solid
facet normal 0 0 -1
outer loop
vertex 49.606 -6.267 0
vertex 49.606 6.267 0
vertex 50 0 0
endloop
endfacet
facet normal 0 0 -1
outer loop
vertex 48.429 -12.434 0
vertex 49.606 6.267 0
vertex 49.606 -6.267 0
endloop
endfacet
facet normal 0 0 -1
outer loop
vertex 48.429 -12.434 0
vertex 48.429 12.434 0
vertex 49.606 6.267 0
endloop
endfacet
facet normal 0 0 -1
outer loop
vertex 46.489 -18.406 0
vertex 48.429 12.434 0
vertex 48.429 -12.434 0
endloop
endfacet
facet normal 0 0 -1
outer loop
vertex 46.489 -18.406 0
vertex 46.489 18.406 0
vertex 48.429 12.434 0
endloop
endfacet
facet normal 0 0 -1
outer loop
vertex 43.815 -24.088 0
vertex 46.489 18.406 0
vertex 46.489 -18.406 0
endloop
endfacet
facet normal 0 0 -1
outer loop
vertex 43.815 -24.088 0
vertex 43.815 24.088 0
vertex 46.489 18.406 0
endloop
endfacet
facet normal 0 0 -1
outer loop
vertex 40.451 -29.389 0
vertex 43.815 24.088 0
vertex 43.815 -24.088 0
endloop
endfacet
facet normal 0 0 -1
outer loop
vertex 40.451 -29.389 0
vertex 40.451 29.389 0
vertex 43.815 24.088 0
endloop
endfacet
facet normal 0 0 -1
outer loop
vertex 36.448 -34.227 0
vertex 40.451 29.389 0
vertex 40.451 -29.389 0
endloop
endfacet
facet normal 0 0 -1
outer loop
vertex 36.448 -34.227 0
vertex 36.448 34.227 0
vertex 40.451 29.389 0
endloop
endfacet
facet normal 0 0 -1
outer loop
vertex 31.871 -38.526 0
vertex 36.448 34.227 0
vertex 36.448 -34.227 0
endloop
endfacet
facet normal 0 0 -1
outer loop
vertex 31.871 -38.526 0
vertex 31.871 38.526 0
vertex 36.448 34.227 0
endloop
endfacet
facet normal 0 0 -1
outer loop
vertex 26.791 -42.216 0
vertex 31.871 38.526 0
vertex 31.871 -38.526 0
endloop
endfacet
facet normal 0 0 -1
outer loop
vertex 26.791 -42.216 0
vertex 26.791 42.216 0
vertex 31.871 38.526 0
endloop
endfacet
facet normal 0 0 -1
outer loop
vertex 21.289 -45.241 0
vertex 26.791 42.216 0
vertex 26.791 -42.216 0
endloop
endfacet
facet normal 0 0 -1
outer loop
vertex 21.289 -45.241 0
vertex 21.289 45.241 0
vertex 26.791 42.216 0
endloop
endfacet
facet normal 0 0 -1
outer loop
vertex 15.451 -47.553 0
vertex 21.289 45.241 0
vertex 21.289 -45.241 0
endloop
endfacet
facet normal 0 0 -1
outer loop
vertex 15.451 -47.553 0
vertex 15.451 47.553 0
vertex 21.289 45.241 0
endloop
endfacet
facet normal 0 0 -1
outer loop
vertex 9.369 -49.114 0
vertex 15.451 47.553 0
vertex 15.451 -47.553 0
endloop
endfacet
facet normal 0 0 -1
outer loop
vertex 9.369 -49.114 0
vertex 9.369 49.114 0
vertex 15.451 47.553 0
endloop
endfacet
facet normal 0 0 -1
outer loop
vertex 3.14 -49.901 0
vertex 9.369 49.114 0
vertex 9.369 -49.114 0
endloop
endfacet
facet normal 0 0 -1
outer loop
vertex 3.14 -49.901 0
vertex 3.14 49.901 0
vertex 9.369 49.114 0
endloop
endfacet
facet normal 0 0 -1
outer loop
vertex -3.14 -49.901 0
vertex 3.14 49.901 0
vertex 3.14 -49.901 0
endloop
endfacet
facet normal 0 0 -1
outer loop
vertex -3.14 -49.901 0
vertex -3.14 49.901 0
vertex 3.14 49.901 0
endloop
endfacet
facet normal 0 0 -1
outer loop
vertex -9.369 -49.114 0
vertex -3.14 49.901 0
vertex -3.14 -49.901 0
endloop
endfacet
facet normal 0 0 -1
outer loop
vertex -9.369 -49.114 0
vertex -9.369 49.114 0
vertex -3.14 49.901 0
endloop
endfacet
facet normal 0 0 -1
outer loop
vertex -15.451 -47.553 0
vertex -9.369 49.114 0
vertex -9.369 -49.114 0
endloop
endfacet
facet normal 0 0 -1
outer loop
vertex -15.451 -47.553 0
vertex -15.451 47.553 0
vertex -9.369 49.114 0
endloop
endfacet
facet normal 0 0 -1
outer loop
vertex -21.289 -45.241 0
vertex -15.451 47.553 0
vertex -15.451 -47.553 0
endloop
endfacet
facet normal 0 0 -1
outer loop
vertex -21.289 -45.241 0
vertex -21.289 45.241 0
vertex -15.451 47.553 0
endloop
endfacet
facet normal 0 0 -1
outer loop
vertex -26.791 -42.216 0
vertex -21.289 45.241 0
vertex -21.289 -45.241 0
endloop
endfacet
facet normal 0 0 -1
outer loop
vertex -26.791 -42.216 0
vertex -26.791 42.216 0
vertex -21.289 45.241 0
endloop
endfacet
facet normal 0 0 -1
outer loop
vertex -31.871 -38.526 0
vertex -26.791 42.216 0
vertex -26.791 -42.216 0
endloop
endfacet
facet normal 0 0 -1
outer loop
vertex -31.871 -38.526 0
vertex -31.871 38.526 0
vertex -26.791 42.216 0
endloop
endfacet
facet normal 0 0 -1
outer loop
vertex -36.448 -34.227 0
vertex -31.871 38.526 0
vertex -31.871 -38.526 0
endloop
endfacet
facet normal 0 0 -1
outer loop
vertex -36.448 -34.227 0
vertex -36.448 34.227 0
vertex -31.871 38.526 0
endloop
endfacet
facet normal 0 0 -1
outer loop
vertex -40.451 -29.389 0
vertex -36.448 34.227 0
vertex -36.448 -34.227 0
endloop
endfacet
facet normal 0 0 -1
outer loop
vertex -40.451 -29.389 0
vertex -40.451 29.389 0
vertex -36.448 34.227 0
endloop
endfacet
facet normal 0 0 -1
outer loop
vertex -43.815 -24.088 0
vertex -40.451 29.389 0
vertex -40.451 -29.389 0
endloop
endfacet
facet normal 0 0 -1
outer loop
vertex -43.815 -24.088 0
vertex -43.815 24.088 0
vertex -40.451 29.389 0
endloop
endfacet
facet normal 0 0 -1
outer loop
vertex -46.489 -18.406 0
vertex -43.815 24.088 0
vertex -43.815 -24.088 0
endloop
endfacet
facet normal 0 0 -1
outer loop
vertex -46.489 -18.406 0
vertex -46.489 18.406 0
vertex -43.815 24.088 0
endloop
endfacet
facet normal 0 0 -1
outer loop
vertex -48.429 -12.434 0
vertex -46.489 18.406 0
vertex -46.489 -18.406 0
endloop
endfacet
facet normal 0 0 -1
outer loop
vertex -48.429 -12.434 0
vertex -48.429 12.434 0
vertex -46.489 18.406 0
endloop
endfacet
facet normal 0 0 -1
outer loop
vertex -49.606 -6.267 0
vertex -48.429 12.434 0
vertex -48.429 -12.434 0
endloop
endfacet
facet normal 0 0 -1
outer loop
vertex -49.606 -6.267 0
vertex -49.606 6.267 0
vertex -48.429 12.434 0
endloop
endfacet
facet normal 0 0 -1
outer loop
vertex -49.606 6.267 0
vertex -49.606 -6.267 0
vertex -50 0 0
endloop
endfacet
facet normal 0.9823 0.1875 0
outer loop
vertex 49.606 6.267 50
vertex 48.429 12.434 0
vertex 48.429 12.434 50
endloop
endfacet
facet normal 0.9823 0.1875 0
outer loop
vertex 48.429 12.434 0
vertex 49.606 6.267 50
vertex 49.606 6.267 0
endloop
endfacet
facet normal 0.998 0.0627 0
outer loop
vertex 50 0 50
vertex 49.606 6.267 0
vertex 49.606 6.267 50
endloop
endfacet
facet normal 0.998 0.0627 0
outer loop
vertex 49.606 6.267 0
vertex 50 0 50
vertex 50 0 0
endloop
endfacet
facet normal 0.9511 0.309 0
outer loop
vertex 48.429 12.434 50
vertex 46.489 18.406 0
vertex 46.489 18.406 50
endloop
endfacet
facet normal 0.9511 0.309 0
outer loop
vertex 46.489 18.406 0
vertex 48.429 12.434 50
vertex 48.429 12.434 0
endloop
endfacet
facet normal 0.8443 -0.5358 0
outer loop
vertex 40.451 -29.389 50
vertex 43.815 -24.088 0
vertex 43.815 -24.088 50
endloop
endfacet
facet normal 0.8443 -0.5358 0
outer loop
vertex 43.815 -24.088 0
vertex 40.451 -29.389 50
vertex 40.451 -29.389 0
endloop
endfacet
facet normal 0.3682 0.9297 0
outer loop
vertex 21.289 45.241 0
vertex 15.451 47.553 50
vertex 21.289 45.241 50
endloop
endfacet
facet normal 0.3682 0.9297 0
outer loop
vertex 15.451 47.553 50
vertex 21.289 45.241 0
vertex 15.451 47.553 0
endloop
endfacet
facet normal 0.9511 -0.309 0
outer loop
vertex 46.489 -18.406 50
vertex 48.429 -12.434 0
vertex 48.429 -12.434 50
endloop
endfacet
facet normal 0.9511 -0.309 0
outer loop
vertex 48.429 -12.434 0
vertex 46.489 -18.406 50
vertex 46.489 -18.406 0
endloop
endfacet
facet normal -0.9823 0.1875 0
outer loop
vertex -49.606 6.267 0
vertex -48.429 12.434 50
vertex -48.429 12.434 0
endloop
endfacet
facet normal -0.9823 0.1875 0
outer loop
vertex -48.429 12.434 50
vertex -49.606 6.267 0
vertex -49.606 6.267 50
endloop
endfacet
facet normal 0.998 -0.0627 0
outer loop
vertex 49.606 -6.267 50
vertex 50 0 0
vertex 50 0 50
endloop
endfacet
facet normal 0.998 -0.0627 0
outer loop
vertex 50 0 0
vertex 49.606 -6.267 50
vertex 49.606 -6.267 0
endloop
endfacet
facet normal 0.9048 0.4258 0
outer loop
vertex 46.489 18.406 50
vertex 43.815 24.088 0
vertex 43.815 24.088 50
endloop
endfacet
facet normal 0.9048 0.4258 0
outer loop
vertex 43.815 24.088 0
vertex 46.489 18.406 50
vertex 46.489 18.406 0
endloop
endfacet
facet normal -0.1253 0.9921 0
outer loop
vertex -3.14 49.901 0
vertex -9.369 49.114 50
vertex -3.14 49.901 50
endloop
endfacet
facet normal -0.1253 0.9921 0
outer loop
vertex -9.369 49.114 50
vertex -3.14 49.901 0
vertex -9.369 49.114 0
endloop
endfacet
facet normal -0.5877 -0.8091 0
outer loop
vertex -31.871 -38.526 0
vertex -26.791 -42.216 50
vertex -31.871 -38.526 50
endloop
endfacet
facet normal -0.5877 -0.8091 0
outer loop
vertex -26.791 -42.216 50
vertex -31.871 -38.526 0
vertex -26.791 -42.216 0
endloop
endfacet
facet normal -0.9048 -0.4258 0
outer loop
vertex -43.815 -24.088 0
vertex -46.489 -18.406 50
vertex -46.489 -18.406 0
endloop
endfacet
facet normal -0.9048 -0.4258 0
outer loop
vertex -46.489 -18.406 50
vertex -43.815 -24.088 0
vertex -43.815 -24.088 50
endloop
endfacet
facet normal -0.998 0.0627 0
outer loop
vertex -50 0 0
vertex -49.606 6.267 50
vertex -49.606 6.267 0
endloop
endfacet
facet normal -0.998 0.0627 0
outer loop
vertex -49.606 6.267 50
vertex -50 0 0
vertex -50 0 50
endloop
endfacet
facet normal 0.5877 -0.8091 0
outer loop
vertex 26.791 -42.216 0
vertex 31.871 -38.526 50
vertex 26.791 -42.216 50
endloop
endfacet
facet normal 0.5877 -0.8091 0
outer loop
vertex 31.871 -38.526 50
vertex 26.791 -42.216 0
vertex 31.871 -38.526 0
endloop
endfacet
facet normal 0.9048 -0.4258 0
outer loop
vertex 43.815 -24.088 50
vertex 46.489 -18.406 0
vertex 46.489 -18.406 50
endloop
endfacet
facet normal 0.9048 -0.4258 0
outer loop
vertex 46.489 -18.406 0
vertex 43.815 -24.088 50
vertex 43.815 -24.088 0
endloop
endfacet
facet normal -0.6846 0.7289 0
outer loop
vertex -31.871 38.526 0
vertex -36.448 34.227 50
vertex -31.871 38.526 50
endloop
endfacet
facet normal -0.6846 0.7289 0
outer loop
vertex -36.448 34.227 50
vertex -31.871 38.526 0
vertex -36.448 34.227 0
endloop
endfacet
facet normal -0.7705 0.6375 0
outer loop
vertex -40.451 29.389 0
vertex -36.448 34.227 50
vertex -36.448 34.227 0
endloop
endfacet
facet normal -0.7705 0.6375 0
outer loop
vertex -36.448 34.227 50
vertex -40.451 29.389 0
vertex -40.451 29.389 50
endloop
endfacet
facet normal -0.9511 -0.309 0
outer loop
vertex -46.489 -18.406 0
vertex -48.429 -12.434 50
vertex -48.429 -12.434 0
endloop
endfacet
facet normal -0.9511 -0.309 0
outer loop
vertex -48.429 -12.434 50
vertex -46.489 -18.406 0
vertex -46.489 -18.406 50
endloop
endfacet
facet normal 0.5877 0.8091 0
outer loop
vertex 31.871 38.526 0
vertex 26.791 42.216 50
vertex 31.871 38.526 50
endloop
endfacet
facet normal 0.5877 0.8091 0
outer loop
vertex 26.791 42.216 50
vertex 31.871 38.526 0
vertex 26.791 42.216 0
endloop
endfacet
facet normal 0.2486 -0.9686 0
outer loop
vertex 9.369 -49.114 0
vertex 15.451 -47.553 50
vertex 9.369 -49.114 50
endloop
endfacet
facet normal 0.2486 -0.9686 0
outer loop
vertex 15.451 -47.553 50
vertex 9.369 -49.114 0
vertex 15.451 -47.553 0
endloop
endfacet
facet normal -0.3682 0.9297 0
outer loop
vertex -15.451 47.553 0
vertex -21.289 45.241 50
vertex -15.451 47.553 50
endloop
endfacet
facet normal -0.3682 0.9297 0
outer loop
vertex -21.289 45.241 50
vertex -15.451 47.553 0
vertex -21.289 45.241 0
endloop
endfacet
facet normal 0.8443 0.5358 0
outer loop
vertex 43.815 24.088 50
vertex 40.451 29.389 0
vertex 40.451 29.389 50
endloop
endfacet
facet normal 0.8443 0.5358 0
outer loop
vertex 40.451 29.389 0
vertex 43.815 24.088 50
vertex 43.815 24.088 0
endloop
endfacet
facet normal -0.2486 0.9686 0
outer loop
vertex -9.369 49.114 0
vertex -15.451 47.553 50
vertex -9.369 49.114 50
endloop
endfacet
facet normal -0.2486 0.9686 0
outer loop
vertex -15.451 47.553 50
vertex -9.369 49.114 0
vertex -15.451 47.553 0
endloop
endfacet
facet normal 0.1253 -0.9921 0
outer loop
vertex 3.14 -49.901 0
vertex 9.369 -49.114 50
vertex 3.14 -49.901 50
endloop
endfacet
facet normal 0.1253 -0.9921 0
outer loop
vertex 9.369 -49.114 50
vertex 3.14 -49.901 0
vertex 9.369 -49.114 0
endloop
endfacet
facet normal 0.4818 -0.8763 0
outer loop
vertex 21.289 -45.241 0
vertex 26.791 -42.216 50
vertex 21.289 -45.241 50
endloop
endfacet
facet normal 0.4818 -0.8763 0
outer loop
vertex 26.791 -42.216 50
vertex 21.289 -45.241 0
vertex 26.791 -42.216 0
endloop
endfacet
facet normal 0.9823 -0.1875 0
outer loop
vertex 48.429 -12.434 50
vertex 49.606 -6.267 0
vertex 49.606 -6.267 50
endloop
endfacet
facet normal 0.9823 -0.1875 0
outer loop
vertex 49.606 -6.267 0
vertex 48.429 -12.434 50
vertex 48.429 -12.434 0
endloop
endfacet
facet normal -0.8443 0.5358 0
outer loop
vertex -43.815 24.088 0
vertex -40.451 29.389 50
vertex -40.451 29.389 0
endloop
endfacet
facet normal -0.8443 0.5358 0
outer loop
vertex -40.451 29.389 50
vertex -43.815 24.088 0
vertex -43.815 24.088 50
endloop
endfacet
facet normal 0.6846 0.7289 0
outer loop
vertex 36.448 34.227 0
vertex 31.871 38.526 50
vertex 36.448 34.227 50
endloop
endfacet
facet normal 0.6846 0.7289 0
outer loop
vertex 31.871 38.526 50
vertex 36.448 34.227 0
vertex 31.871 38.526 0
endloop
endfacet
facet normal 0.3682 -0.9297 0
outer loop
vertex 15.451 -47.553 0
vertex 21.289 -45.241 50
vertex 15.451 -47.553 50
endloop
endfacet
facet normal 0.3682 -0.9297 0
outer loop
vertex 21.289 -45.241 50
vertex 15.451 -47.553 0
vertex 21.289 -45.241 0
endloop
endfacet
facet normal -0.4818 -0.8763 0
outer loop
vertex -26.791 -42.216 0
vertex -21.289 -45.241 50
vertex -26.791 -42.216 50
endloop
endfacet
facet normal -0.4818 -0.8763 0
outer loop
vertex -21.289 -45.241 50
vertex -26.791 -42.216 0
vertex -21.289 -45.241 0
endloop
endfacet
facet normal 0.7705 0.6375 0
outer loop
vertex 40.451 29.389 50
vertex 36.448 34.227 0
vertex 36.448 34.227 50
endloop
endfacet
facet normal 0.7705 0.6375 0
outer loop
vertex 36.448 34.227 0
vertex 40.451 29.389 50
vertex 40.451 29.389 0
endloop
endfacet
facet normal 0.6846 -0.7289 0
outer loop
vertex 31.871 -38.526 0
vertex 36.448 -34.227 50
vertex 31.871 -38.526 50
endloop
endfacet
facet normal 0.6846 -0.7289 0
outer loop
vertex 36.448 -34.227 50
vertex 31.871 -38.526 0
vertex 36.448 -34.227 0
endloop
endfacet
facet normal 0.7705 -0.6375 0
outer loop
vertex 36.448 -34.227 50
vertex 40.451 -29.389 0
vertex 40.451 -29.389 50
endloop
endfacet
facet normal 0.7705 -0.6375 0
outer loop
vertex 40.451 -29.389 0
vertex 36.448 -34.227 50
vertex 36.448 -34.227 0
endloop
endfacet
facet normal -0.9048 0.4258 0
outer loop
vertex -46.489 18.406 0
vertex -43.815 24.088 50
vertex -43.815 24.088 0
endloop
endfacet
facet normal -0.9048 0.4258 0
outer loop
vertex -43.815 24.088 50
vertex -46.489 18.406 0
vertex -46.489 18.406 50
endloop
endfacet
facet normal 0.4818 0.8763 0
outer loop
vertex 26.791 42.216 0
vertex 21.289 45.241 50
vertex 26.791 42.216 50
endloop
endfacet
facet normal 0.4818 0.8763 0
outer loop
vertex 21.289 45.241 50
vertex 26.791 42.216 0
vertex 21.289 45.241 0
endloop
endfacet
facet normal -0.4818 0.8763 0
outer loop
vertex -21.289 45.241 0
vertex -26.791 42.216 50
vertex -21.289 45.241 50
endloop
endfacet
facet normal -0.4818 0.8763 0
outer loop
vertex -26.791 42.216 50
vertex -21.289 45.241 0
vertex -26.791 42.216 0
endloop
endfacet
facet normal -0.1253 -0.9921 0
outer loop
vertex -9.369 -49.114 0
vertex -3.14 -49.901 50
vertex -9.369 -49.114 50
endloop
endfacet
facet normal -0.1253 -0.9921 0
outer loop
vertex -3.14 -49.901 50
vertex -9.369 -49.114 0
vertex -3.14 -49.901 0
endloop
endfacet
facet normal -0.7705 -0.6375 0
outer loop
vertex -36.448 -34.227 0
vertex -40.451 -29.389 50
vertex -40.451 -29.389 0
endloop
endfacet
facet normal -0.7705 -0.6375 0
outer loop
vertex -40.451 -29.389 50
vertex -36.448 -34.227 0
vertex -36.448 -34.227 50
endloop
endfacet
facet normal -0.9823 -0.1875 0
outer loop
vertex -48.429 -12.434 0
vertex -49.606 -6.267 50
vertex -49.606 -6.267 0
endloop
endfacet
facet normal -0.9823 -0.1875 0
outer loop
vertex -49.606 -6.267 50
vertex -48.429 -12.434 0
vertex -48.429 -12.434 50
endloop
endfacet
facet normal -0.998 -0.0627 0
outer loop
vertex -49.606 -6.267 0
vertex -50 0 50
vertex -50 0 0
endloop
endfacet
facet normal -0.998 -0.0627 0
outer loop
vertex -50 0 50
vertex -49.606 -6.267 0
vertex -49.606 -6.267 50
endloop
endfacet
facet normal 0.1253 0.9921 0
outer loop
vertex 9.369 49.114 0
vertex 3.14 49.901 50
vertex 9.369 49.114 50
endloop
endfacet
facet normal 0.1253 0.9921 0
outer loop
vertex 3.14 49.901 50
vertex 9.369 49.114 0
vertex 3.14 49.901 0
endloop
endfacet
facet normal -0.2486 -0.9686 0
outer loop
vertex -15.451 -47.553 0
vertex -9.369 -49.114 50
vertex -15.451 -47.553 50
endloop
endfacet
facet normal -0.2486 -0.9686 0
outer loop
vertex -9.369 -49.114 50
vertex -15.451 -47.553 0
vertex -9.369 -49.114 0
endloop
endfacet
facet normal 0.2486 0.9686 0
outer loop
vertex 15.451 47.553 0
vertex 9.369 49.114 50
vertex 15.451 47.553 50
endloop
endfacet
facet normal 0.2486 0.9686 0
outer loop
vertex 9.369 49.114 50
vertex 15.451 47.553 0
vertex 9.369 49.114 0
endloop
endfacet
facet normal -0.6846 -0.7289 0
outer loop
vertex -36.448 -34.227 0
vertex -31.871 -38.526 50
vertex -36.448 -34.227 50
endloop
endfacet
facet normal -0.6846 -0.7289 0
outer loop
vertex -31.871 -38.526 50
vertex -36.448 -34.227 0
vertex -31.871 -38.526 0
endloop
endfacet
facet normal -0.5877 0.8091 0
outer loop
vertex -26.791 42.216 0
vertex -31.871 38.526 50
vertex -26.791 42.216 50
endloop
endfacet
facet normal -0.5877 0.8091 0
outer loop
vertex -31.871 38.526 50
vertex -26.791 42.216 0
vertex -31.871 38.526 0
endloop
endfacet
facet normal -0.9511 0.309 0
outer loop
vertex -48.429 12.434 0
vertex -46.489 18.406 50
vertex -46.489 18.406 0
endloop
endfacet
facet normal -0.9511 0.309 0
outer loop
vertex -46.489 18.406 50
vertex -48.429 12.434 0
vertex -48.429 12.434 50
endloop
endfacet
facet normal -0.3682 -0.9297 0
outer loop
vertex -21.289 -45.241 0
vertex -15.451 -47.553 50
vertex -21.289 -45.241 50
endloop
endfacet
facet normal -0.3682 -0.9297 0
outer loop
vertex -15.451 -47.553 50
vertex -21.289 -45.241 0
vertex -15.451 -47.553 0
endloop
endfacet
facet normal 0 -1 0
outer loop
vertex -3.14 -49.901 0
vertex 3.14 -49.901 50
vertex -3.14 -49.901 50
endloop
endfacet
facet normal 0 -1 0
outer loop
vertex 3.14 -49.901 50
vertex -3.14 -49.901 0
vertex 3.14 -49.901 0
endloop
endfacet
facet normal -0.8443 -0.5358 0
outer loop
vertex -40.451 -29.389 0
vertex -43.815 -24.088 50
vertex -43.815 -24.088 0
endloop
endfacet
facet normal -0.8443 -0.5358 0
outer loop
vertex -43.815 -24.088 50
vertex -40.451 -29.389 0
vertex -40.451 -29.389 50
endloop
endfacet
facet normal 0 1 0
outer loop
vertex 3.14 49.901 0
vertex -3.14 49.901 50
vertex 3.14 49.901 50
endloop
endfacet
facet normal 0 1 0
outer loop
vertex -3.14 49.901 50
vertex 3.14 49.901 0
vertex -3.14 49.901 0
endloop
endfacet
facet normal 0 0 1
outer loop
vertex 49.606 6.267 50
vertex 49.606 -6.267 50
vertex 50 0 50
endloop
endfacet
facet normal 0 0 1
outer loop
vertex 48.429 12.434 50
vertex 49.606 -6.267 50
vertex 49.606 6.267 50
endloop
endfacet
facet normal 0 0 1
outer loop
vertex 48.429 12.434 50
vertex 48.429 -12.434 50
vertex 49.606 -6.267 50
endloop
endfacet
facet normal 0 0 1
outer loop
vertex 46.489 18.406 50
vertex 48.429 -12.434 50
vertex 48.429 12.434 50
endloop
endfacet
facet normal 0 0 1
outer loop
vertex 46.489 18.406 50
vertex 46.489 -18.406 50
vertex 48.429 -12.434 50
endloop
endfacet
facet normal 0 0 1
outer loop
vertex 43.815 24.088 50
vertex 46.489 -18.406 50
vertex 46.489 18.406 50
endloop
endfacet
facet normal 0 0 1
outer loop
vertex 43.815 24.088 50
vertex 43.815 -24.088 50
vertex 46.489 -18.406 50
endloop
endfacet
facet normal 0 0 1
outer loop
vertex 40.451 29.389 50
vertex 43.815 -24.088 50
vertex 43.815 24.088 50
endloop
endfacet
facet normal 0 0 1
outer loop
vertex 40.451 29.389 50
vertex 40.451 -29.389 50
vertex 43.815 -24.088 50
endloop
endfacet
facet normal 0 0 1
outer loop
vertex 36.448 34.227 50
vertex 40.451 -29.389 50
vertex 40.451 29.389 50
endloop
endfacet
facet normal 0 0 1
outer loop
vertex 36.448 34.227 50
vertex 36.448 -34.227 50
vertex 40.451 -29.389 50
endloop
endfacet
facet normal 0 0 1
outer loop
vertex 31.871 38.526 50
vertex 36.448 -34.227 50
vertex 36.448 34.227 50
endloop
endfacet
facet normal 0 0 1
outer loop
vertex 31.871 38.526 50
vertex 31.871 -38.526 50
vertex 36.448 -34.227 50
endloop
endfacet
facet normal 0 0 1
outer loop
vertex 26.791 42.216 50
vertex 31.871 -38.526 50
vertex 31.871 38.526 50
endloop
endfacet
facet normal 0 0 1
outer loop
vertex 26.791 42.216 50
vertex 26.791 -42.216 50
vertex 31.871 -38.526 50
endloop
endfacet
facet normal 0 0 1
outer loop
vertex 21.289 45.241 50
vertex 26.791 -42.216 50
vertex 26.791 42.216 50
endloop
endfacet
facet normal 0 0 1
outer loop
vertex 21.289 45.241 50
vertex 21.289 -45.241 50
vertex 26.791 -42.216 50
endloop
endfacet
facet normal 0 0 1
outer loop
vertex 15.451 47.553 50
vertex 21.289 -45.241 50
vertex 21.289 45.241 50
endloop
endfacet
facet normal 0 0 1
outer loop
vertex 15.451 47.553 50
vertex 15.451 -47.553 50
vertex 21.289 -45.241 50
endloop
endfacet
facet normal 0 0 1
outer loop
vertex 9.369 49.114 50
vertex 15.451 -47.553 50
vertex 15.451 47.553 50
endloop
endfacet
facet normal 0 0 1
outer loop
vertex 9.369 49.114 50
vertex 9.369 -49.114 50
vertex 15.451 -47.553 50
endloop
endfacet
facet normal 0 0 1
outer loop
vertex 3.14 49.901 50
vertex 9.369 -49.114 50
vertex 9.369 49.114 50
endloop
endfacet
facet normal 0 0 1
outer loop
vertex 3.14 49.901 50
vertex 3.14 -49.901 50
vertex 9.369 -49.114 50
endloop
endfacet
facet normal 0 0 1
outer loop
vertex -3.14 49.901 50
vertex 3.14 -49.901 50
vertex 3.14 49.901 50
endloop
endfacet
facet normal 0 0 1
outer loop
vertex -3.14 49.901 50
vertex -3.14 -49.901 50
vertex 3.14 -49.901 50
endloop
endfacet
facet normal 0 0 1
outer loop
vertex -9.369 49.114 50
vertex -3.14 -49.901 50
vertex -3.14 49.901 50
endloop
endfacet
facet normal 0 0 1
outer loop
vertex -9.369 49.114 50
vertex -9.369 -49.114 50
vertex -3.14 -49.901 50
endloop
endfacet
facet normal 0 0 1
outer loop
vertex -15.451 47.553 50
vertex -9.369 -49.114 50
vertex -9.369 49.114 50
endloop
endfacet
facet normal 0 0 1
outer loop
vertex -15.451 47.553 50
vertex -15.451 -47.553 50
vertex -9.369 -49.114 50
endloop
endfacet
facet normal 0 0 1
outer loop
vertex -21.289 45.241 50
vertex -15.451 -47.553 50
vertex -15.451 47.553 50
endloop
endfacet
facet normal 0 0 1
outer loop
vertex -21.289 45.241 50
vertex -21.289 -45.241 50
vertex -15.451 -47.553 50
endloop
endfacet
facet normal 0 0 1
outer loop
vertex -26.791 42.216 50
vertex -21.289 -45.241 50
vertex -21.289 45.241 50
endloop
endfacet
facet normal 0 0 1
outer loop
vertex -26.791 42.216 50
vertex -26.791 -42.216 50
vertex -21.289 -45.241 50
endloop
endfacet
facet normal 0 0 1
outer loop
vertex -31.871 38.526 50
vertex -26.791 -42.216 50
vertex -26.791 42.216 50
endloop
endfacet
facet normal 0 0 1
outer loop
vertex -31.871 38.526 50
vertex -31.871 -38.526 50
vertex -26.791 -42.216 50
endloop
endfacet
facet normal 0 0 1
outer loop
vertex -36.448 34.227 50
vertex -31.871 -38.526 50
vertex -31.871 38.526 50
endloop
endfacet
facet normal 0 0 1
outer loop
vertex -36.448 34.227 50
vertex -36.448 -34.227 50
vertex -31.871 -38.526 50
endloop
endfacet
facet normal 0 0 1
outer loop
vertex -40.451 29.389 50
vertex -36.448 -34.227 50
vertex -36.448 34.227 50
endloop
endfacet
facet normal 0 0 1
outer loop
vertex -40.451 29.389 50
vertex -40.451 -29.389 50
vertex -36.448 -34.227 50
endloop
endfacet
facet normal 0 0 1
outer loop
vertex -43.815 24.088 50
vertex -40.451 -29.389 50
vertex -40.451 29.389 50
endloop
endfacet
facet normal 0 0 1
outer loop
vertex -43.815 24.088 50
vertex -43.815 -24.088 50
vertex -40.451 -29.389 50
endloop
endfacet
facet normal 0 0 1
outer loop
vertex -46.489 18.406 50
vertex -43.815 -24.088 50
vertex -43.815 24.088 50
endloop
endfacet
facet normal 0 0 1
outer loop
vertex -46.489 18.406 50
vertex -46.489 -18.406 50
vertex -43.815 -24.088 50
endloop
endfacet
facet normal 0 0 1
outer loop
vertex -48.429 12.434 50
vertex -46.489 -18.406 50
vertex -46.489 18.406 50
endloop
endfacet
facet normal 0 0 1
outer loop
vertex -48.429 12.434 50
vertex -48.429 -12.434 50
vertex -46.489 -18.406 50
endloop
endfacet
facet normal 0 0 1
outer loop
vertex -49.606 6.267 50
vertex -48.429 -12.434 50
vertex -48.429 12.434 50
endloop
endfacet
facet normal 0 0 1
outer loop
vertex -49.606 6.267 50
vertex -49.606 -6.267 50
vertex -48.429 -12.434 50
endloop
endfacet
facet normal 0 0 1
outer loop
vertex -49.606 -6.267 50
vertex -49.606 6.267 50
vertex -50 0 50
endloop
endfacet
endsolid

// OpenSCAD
// file: configuration.scad
platform_thickness=8;
arm_distance=50;
platform_hinge_offset=33;
// main file
$fn = 50;
include <configuration.scad>
debug = 0;
vitamins = 1;

extrusion_ox = 30;
extrusion_oy = 20;
extrusion_ix = 28;
extrusion_iy = 18;

smooth_rod_dia = 8;
smooth_rod_offset = 60;

h=100;
extrusion_offset_y = 20;

module extrusion(h) {
	difference() {
		cube (size = [extrusion_ox, extrusion_oy, h], center = true);
		cube (size = [extrusion_ix, extrusion_iy, h+10], center = true);
	}
}

module smooth_rod(h, dia){
	cylinder (h = h, r = dia/2, center = true);
}

module tower_base() {
	cube (size = [1, 1, 1]);
	cylinder (h =50 , r =50 );
}

tower_base(50);

if (vitamins) {
	%color([1,0,0,0.5]) {
		translate ([0, extrusion_offset_y, h/2]) extrusion(100);
		for (i = [-1,1]) {
			translate ([i*smooth_rod_offset/2, 0, 0]) {
				translate ([0, 0, h/2]) smooth_rod(h, smooth_rod_dia);
				translate ([0, 0, 30/2]) rotate (a = [0, 0, i*30]) translate ([0, -h/2-10, 0]) rotate (a = [90, 0, 0]) rotate (a = [0, 0, 90]) extrusion(h);
			}
		}
		
	}
}
